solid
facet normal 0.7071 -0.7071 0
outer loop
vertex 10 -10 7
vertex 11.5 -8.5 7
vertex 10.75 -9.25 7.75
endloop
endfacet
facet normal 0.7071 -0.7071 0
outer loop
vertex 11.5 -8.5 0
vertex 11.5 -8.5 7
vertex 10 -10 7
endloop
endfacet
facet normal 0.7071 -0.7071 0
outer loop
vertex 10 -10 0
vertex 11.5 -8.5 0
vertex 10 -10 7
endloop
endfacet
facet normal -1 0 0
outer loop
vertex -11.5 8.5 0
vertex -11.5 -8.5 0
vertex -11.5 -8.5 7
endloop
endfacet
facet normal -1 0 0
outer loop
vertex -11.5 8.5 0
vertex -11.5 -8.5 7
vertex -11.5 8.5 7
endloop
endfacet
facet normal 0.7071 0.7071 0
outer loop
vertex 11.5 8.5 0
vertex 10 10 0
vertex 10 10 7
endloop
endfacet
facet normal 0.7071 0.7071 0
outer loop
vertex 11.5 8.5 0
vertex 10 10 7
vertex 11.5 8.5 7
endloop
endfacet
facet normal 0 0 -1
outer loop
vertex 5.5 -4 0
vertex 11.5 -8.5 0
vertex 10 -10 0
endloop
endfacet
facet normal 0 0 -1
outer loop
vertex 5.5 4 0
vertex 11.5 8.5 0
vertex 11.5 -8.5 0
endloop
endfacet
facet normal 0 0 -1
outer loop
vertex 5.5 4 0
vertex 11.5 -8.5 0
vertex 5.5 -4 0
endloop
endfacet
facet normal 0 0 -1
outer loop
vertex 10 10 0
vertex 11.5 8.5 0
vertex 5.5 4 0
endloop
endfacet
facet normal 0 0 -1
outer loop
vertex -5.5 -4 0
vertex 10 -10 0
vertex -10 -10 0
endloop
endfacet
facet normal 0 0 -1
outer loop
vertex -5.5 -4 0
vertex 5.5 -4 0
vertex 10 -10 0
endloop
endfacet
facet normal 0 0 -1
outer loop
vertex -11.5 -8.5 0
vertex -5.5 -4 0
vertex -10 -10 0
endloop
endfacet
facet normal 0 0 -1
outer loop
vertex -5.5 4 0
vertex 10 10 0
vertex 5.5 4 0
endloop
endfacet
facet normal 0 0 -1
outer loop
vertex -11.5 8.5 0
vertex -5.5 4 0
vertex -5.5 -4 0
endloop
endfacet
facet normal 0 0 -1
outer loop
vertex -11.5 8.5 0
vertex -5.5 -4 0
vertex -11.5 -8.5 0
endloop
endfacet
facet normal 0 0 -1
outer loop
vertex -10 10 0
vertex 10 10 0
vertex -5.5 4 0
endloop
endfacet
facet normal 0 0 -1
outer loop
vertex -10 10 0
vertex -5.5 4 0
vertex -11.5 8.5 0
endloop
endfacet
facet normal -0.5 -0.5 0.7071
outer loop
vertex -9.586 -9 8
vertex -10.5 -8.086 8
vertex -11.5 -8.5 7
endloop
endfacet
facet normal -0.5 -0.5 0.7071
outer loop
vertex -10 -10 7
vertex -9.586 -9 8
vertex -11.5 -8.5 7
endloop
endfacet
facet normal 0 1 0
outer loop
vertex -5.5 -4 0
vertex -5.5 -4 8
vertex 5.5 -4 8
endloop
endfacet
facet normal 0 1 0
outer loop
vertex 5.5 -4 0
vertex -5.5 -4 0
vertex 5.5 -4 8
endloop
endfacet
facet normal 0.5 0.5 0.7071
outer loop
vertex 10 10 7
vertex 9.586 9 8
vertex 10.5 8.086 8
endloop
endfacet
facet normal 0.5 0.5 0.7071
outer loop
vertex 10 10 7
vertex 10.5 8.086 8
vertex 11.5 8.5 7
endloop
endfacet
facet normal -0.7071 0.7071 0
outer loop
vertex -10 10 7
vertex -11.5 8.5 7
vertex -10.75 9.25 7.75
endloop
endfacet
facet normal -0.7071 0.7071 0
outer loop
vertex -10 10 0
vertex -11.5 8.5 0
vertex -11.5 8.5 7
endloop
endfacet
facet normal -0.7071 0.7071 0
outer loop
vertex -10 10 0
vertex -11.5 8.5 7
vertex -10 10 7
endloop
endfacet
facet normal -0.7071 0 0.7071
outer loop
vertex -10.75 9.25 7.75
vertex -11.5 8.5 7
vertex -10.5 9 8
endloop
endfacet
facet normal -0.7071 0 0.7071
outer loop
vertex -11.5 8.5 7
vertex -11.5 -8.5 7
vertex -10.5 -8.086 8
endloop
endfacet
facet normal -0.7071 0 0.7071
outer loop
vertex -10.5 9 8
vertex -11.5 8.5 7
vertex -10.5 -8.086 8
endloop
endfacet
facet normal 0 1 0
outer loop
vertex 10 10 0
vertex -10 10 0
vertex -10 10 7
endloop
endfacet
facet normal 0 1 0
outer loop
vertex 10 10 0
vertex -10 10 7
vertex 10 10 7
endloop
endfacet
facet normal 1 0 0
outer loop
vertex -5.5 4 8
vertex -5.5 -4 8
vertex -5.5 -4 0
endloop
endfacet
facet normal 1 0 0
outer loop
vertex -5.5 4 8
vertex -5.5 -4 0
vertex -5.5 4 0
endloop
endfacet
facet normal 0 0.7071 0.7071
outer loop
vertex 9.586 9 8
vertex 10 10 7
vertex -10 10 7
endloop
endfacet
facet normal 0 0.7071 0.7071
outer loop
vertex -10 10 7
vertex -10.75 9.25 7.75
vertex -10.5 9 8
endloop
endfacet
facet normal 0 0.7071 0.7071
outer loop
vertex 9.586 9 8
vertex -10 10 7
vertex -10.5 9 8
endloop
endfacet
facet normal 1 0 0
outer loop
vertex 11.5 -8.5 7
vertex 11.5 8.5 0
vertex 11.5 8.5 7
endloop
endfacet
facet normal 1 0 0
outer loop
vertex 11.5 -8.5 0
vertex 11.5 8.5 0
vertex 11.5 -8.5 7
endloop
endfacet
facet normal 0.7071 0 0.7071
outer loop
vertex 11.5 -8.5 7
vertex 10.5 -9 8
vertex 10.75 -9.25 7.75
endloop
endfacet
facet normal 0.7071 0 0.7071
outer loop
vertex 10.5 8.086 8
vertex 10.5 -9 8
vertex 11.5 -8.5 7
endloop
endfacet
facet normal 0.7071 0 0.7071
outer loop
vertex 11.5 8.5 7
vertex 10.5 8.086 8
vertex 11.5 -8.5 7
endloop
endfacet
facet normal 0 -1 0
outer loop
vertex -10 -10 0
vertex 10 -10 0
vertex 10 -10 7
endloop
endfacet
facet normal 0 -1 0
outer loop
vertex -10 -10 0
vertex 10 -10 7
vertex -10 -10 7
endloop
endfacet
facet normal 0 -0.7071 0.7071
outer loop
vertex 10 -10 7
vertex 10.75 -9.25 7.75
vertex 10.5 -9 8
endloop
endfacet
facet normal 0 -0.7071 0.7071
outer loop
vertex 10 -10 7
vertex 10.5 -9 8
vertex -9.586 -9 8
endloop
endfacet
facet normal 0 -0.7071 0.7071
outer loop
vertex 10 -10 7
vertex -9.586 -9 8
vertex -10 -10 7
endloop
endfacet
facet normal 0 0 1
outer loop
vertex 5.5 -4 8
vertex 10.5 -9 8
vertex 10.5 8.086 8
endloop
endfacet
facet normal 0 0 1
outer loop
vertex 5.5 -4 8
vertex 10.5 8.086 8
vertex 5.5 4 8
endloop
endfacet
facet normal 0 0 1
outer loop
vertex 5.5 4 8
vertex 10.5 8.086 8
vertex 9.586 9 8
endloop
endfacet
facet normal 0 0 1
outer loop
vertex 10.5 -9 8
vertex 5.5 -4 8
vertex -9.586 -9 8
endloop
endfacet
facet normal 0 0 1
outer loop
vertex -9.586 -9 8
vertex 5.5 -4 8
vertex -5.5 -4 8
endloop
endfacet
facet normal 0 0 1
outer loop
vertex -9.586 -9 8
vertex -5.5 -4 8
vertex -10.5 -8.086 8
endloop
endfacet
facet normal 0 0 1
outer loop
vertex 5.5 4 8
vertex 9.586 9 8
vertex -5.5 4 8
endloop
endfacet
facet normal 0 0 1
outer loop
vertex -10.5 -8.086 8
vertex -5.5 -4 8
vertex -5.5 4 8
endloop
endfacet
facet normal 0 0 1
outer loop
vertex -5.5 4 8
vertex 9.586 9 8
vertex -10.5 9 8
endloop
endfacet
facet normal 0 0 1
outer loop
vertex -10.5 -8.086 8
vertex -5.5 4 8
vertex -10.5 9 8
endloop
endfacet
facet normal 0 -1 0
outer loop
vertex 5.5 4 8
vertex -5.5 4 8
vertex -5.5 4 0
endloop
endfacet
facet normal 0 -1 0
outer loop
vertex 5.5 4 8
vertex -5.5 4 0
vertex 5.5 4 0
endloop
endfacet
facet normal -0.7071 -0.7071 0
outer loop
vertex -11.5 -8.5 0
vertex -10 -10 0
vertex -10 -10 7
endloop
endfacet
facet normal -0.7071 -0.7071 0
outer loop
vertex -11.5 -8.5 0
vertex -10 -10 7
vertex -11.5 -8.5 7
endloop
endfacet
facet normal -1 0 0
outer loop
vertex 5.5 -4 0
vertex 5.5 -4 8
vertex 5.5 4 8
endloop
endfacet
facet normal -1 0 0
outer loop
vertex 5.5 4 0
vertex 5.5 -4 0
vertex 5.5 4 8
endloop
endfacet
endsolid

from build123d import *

# Parameters (mm, degrees)
SALIENTE_EXTRUIR1_DEPTH = 8
CROQUIS2_W              = 11
CROQUIS2_H              = 8
CORTAR_EXTRUIR1_DEPTH   = 18.211914478
CHAFL_N1_SIZE           = 1


with BuildPart() as part:
    # Croquis1 → Saliente-Extruir1 (new body)
    with BuildSketch(Plane.XY):
        Polygon((-11.5, 8.5), (-10, 10), (10, 10), (11.5, 8.5), (11.5, -8.5), (10, -10), (-10, -10), (-11.5, -8.5), align=None)
    extrude(amount=SALIENTE_EXTRUIR1_DEPTH)

    # Croquis2 → Cortar-Extruir1 (cut, through all)
    with BuildSketch(Plane.XY.offset(8)):
        Rectangle(CROQUIS2_W, CROQUIS2_H)
    extrude(amount=-CORTAR_EXTRUIR1_DEPTH, mode=Mode.SUBTRACT)

    # Chaflán1
    # the kernel refuses this chamfer: 1 mm, written as the material it takes off along each edge
    with BuildSketch(Plane(origin=(-11.5, -11.071682988, 8), x_dir=(-0.027495876610585623, 0, -0.9996219169112968), z_dir=(0, 1, 0))) as chafl_n1_piece_1:
        Polygon((CHAFL_N1_SIZE * 0.999621916911, -CHAFL_N1_SIZE * 0.0274958766106), (-CHAFL_N1_SIZE * 0.0274958766106, -CHAFL_N1_SIZE * 0.999621916911), (0, 0), align=None)
    extrude(amount=22.143365976, mode=Mode.SUBTRACT)
    with BuildSketch(Plane(origin=(-8.18154552, -11.81845448, 8), x_dir=(0.7068394360706735, 0.7068394360706735, 0.02749587661058563), z_dir=(-0.7071067811865476, 0.7071067811865476, 0)), Plane(origin=(8.18154552, 11.81845448, 8), x_dir=(-0.7068394360706735, -0.7068394360706735, 0.02749587661058563), z_dir=(0.7071067811865476, -0.7071067811865476, 0))) as chafl_n1_piece_2:
        Polygon((CHAFL_N1_SIZE * 0.999621916911, CHAFL_N1_SIZE * 0.0274958766106), (-CHAFL_N1_SIZE * 0.0274958766106, CHAFL_N1_SIZE * 0.999621916911), (0, 0), align=None)
    extrude(amount=7.264686319, mode=Mode.SUBTRACT)
    with BuildSketch(Plane(origin=(12.571682988, -10, 8), x_dir=(0, 0.9996219169112968, 0.027495876610585647), z_dir=(-1, 0, 0))) as chafl_n1_piece_3:
        Polygon((CHAFL_N1_SIZE * 0.999621916911, CHAFL_N1_SIZE * 0.0274958766106), (-CHAFL_N1_SIZE * 0.0274958766106, CHAFL_N1_SIZE * 0.999621916911), (0, 0), align=None)
    extrude(amount=25.143365976, mode=Mode.SUBTRACT)
    with BuildSketch(Plane(origin=(11.5, 11.071682988, 8), x_dir=(-0.9996219169112968, 0, 0.027495876610585647), z_dir=(0, -1, 0))) as chafl_n1_piece_4:
        Polygon((CHAFL_N1_SIZE * 0.999621916911, CHAFL_N1_SIZE * 0.0274958766106), (-CHAFL_N1_SIZE * 0.0274958766106, CHAFL_N1_SIZE * 0.999621916911), (0, 0), align=None)
    extrude(amount=22.143365976, mode=Mode.SUBTRACT)
    with BuildSketch(Plane(origin=(-12.571682988, 10, 8), x_dir=(0, 0.027495876610585623, -0.9996219169112968), z_dir=(1, 0, 0))) as chafl_n1_piece_5:
        Polygon((CHAFL_N1_SIZE * 0.999621916911, -CHAFL_N1_SIZE * 0.0274958766106), (-CHAFL_N1_SIZE * 0.0274958766106, -CHAFL_N1_SIZE * 0.999621916911), (0, 0), align=None)
    extrude(amount=25.143365976, mode=Mode.SUBTRACT)


solid = part.part
